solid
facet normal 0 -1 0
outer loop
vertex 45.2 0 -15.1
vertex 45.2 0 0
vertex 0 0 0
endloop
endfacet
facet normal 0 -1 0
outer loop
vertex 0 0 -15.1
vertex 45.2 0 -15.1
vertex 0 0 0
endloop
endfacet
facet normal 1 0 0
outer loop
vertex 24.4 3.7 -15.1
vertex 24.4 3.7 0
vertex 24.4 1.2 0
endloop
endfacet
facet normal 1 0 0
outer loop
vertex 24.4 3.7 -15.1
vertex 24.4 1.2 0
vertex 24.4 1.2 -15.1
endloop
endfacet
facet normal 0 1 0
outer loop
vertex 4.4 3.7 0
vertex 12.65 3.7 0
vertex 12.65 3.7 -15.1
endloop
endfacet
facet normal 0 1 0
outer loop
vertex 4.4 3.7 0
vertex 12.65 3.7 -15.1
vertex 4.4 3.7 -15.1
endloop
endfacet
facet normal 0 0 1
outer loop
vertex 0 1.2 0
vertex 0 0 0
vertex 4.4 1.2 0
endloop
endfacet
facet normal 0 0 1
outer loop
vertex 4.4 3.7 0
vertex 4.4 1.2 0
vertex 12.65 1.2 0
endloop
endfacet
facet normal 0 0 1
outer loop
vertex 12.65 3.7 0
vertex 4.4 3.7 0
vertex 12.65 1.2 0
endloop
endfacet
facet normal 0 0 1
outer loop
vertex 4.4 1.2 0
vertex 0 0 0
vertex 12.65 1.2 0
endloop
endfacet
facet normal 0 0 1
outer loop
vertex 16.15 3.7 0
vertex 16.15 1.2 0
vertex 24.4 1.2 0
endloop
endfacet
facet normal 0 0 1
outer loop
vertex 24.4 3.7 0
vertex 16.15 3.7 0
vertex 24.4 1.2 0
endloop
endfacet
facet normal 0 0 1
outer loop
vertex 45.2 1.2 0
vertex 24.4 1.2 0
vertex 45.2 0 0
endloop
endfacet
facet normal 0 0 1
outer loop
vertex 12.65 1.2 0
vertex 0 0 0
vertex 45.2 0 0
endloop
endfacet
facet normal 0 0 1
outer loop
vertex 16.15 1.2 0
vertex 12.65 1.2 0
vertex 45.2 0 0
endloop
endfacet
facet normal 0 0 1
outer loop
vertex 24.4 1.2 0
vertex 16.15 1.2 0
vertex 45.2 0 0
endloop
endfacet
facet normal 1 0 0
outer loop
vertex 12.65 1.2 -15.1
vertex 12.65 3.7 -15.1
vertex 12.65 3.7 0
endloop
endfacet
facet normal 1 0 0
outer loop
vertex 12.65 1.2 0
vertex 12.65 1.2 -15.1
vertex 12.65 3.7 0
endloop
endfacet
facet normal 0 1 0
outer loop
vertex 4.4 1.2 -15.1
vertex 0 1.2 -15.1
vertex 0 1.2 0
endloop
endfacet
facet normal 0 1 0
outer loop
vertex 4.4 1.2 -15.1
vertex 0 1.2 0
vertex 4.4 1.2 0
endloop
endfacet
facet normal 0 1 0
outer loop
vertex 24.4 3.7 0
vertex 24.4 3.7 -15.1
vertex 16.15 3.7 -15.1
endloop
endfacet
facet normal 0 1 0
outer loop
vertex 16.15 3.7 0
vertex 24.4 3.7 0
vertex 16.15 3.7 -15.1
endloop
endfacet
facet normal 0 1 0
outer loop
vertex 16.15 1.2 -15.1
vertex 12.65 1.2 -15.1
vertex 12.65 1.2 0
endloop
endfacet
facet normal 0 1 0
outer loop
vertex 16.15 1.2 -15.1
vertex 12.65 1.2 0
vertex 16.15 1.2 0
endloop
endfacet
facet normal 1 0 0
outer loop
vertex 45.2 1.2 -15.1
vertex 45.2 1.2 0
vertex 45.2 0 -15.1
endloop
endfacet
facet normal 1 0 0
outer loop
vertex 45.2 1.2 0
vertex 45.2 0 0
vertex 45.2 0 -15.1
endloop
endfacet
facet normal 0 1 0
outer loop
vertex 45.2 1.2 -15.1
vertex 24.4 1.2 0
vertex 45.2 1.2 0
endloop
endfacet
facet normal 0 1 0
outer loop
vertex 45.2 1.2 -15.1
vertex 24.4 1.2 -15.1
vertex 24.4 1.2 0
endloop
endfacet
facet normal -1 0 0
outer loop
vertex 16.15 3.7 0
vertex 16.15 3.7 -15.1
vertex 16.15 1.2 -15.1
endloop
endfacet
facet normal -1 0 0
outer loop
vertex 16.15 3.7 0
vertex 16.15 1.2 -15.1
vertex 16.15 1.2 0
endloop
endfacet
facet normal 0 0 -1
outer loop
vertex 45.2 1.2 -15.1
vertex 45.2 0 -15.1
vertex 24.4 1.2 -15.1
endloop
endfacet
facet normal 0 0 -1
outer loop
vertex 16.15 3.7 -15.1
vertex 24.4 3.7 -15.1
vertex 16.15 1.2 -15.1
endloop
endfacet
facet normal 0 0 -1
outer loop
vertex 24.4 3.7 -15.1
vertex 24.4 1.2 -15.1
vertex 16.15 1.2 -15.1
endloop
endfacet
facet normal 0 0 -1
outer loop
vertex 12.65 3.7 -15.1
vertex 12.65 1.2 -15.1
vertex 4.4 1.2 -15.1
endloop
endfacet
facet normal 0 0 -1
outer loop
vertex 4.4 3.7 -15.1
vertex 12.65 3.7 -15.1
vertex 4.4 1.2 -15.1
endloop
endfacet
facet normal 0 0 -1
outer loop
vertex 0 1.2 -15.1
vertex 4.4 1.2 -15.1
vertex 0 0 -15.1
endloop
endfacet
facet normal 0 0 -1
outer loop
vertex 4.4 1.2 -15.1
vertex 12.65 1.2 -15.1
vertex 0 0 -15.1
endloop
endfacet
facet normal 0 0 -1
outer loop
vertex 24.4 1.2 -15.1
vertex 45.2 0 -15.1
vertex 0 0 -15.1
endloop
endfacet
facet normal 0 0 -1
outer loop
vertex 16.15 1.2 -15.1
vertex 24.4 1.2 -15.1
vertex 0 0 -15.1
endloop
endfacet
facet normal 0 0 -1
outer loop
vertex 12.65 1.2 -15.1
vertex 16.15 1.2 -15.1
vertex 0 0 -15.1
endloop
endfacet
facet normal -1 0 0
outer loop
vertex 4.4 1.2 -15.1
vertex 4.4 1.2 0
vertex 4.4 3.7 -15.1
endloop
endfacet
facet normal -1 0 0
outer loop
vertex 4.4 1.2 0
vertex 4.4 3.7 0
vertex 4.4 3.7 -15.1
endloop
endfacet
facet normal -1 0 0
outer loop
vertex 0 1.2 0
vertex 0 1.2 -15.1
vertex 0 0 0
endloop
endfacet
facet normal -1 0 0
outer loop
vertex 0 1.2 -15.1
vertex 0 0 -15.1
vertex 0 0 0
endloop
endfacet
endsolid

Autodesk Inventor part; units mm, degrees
ref_plane "YZ Plane" through (0, 0, 0) normal (1, 0, 0) x (0, 1, 0)
ref_plane "XZ Plane" through (0, 0, 0) normal (0, 1, 0) x (-1, 0, 0)
ref_plane "XY Plane" through (0, 0, 0) normal (0, 0, 1) x (1, 0, 0)
sketch "스케치1" plane through (0, 0, 0) normal (0, 1, 0) x (-1, 0, 0)
  line L0 (0, 0) -> (-45.2, 0)
  line L1 (-45.2, 0) -> (-45.2, -15.1)
  line L2 (-45.2, -15.1) -> (0, -15.1)
  line L3 (0, -15.1) -> (0, 0)
  dimension "d0" = 45.2
  dimension "d1" = 15.1
extrude "돌출1" add sketch "스케치1" along normal blind 3.7
sketch "스케치2" plane through (0, 3.7, 0) normal (0, 1, 0) x (1, 0, 0)
  line L0 (0, 0) -> (45.2, 0) projected
  line L1 (45.2, 15.1) -> (0, 15.1) projected
  line L2 (0, 0) -> (4.4, 0)
  line L3 (4.4, 0) -> (4.4, 15.1)
  line L4 (4.4, 15.1) -> (0, 15.1)
  line L5 (0, 15.1) -> (0, 0)
  line L6 (4.4, 15.1) -> (14.4, 15.1)
  line L7 (14.4, 15.1) -> (14.4, 0)
  line L8 (14.4, 0) -> (4.4, 0)
  line L9 (4.4, 0) -> (4.4, 15.1)
  line L10 (14.4, 0) -> (13.4, 0)
  line L11 (13.4, 0) -> (15.4, 0)
  line L12 (13.4, 0) -> (5.6, 0)
  line L13 (5.6, 0) -> (5.6, 15.1)
  line L14 (5.6, 15.1) -> (13.4, 15.1)
  line L15 (13.4, 15.1) -> (13.4, 0)
  line L16 (15.4, 0) -> (23.2, 0)
  line L17 (23.2, 0) -> (23.2, 15.1)
  line L18 (23.2, 15.1) -> (15.4, 15.1)
  line L19 (15.4, 15.1) -> (15.4, 0)
  line L20 (23.2, 15.1) -> (45.2, 15.1)
  line L21 (45.2, 15.1) -> (45.2, 0)
  line L22 (45.2, 0) -> (23.2, 0)
  line L23 (23.2, 0) -> (23.2, 15.1)
  dimension "d4" = 4.4
  dimension "d5" = 10
  dimension "d6" = 1
  dimension "d7" = 2
  dimension "d8" = 7.8
  dimension "d9" = 7.8
extrude "돌출2" cut sketch "스케치2" against normal blind 2.5 contours L5 L1 L3 L0 | L15 L1 L7 L0 | L7 L1 L19 L0 | L17 L1 L21 L0
offset faces "크기1" outward -0.75 faces at (13.4, 2.8667, -10.0667) (15.4, 2.8667, -5.0333)
offset faces "크기2" outward 1.2 faces at (23.2, 2.0333, -5.0333)
properties part number "BMS"
